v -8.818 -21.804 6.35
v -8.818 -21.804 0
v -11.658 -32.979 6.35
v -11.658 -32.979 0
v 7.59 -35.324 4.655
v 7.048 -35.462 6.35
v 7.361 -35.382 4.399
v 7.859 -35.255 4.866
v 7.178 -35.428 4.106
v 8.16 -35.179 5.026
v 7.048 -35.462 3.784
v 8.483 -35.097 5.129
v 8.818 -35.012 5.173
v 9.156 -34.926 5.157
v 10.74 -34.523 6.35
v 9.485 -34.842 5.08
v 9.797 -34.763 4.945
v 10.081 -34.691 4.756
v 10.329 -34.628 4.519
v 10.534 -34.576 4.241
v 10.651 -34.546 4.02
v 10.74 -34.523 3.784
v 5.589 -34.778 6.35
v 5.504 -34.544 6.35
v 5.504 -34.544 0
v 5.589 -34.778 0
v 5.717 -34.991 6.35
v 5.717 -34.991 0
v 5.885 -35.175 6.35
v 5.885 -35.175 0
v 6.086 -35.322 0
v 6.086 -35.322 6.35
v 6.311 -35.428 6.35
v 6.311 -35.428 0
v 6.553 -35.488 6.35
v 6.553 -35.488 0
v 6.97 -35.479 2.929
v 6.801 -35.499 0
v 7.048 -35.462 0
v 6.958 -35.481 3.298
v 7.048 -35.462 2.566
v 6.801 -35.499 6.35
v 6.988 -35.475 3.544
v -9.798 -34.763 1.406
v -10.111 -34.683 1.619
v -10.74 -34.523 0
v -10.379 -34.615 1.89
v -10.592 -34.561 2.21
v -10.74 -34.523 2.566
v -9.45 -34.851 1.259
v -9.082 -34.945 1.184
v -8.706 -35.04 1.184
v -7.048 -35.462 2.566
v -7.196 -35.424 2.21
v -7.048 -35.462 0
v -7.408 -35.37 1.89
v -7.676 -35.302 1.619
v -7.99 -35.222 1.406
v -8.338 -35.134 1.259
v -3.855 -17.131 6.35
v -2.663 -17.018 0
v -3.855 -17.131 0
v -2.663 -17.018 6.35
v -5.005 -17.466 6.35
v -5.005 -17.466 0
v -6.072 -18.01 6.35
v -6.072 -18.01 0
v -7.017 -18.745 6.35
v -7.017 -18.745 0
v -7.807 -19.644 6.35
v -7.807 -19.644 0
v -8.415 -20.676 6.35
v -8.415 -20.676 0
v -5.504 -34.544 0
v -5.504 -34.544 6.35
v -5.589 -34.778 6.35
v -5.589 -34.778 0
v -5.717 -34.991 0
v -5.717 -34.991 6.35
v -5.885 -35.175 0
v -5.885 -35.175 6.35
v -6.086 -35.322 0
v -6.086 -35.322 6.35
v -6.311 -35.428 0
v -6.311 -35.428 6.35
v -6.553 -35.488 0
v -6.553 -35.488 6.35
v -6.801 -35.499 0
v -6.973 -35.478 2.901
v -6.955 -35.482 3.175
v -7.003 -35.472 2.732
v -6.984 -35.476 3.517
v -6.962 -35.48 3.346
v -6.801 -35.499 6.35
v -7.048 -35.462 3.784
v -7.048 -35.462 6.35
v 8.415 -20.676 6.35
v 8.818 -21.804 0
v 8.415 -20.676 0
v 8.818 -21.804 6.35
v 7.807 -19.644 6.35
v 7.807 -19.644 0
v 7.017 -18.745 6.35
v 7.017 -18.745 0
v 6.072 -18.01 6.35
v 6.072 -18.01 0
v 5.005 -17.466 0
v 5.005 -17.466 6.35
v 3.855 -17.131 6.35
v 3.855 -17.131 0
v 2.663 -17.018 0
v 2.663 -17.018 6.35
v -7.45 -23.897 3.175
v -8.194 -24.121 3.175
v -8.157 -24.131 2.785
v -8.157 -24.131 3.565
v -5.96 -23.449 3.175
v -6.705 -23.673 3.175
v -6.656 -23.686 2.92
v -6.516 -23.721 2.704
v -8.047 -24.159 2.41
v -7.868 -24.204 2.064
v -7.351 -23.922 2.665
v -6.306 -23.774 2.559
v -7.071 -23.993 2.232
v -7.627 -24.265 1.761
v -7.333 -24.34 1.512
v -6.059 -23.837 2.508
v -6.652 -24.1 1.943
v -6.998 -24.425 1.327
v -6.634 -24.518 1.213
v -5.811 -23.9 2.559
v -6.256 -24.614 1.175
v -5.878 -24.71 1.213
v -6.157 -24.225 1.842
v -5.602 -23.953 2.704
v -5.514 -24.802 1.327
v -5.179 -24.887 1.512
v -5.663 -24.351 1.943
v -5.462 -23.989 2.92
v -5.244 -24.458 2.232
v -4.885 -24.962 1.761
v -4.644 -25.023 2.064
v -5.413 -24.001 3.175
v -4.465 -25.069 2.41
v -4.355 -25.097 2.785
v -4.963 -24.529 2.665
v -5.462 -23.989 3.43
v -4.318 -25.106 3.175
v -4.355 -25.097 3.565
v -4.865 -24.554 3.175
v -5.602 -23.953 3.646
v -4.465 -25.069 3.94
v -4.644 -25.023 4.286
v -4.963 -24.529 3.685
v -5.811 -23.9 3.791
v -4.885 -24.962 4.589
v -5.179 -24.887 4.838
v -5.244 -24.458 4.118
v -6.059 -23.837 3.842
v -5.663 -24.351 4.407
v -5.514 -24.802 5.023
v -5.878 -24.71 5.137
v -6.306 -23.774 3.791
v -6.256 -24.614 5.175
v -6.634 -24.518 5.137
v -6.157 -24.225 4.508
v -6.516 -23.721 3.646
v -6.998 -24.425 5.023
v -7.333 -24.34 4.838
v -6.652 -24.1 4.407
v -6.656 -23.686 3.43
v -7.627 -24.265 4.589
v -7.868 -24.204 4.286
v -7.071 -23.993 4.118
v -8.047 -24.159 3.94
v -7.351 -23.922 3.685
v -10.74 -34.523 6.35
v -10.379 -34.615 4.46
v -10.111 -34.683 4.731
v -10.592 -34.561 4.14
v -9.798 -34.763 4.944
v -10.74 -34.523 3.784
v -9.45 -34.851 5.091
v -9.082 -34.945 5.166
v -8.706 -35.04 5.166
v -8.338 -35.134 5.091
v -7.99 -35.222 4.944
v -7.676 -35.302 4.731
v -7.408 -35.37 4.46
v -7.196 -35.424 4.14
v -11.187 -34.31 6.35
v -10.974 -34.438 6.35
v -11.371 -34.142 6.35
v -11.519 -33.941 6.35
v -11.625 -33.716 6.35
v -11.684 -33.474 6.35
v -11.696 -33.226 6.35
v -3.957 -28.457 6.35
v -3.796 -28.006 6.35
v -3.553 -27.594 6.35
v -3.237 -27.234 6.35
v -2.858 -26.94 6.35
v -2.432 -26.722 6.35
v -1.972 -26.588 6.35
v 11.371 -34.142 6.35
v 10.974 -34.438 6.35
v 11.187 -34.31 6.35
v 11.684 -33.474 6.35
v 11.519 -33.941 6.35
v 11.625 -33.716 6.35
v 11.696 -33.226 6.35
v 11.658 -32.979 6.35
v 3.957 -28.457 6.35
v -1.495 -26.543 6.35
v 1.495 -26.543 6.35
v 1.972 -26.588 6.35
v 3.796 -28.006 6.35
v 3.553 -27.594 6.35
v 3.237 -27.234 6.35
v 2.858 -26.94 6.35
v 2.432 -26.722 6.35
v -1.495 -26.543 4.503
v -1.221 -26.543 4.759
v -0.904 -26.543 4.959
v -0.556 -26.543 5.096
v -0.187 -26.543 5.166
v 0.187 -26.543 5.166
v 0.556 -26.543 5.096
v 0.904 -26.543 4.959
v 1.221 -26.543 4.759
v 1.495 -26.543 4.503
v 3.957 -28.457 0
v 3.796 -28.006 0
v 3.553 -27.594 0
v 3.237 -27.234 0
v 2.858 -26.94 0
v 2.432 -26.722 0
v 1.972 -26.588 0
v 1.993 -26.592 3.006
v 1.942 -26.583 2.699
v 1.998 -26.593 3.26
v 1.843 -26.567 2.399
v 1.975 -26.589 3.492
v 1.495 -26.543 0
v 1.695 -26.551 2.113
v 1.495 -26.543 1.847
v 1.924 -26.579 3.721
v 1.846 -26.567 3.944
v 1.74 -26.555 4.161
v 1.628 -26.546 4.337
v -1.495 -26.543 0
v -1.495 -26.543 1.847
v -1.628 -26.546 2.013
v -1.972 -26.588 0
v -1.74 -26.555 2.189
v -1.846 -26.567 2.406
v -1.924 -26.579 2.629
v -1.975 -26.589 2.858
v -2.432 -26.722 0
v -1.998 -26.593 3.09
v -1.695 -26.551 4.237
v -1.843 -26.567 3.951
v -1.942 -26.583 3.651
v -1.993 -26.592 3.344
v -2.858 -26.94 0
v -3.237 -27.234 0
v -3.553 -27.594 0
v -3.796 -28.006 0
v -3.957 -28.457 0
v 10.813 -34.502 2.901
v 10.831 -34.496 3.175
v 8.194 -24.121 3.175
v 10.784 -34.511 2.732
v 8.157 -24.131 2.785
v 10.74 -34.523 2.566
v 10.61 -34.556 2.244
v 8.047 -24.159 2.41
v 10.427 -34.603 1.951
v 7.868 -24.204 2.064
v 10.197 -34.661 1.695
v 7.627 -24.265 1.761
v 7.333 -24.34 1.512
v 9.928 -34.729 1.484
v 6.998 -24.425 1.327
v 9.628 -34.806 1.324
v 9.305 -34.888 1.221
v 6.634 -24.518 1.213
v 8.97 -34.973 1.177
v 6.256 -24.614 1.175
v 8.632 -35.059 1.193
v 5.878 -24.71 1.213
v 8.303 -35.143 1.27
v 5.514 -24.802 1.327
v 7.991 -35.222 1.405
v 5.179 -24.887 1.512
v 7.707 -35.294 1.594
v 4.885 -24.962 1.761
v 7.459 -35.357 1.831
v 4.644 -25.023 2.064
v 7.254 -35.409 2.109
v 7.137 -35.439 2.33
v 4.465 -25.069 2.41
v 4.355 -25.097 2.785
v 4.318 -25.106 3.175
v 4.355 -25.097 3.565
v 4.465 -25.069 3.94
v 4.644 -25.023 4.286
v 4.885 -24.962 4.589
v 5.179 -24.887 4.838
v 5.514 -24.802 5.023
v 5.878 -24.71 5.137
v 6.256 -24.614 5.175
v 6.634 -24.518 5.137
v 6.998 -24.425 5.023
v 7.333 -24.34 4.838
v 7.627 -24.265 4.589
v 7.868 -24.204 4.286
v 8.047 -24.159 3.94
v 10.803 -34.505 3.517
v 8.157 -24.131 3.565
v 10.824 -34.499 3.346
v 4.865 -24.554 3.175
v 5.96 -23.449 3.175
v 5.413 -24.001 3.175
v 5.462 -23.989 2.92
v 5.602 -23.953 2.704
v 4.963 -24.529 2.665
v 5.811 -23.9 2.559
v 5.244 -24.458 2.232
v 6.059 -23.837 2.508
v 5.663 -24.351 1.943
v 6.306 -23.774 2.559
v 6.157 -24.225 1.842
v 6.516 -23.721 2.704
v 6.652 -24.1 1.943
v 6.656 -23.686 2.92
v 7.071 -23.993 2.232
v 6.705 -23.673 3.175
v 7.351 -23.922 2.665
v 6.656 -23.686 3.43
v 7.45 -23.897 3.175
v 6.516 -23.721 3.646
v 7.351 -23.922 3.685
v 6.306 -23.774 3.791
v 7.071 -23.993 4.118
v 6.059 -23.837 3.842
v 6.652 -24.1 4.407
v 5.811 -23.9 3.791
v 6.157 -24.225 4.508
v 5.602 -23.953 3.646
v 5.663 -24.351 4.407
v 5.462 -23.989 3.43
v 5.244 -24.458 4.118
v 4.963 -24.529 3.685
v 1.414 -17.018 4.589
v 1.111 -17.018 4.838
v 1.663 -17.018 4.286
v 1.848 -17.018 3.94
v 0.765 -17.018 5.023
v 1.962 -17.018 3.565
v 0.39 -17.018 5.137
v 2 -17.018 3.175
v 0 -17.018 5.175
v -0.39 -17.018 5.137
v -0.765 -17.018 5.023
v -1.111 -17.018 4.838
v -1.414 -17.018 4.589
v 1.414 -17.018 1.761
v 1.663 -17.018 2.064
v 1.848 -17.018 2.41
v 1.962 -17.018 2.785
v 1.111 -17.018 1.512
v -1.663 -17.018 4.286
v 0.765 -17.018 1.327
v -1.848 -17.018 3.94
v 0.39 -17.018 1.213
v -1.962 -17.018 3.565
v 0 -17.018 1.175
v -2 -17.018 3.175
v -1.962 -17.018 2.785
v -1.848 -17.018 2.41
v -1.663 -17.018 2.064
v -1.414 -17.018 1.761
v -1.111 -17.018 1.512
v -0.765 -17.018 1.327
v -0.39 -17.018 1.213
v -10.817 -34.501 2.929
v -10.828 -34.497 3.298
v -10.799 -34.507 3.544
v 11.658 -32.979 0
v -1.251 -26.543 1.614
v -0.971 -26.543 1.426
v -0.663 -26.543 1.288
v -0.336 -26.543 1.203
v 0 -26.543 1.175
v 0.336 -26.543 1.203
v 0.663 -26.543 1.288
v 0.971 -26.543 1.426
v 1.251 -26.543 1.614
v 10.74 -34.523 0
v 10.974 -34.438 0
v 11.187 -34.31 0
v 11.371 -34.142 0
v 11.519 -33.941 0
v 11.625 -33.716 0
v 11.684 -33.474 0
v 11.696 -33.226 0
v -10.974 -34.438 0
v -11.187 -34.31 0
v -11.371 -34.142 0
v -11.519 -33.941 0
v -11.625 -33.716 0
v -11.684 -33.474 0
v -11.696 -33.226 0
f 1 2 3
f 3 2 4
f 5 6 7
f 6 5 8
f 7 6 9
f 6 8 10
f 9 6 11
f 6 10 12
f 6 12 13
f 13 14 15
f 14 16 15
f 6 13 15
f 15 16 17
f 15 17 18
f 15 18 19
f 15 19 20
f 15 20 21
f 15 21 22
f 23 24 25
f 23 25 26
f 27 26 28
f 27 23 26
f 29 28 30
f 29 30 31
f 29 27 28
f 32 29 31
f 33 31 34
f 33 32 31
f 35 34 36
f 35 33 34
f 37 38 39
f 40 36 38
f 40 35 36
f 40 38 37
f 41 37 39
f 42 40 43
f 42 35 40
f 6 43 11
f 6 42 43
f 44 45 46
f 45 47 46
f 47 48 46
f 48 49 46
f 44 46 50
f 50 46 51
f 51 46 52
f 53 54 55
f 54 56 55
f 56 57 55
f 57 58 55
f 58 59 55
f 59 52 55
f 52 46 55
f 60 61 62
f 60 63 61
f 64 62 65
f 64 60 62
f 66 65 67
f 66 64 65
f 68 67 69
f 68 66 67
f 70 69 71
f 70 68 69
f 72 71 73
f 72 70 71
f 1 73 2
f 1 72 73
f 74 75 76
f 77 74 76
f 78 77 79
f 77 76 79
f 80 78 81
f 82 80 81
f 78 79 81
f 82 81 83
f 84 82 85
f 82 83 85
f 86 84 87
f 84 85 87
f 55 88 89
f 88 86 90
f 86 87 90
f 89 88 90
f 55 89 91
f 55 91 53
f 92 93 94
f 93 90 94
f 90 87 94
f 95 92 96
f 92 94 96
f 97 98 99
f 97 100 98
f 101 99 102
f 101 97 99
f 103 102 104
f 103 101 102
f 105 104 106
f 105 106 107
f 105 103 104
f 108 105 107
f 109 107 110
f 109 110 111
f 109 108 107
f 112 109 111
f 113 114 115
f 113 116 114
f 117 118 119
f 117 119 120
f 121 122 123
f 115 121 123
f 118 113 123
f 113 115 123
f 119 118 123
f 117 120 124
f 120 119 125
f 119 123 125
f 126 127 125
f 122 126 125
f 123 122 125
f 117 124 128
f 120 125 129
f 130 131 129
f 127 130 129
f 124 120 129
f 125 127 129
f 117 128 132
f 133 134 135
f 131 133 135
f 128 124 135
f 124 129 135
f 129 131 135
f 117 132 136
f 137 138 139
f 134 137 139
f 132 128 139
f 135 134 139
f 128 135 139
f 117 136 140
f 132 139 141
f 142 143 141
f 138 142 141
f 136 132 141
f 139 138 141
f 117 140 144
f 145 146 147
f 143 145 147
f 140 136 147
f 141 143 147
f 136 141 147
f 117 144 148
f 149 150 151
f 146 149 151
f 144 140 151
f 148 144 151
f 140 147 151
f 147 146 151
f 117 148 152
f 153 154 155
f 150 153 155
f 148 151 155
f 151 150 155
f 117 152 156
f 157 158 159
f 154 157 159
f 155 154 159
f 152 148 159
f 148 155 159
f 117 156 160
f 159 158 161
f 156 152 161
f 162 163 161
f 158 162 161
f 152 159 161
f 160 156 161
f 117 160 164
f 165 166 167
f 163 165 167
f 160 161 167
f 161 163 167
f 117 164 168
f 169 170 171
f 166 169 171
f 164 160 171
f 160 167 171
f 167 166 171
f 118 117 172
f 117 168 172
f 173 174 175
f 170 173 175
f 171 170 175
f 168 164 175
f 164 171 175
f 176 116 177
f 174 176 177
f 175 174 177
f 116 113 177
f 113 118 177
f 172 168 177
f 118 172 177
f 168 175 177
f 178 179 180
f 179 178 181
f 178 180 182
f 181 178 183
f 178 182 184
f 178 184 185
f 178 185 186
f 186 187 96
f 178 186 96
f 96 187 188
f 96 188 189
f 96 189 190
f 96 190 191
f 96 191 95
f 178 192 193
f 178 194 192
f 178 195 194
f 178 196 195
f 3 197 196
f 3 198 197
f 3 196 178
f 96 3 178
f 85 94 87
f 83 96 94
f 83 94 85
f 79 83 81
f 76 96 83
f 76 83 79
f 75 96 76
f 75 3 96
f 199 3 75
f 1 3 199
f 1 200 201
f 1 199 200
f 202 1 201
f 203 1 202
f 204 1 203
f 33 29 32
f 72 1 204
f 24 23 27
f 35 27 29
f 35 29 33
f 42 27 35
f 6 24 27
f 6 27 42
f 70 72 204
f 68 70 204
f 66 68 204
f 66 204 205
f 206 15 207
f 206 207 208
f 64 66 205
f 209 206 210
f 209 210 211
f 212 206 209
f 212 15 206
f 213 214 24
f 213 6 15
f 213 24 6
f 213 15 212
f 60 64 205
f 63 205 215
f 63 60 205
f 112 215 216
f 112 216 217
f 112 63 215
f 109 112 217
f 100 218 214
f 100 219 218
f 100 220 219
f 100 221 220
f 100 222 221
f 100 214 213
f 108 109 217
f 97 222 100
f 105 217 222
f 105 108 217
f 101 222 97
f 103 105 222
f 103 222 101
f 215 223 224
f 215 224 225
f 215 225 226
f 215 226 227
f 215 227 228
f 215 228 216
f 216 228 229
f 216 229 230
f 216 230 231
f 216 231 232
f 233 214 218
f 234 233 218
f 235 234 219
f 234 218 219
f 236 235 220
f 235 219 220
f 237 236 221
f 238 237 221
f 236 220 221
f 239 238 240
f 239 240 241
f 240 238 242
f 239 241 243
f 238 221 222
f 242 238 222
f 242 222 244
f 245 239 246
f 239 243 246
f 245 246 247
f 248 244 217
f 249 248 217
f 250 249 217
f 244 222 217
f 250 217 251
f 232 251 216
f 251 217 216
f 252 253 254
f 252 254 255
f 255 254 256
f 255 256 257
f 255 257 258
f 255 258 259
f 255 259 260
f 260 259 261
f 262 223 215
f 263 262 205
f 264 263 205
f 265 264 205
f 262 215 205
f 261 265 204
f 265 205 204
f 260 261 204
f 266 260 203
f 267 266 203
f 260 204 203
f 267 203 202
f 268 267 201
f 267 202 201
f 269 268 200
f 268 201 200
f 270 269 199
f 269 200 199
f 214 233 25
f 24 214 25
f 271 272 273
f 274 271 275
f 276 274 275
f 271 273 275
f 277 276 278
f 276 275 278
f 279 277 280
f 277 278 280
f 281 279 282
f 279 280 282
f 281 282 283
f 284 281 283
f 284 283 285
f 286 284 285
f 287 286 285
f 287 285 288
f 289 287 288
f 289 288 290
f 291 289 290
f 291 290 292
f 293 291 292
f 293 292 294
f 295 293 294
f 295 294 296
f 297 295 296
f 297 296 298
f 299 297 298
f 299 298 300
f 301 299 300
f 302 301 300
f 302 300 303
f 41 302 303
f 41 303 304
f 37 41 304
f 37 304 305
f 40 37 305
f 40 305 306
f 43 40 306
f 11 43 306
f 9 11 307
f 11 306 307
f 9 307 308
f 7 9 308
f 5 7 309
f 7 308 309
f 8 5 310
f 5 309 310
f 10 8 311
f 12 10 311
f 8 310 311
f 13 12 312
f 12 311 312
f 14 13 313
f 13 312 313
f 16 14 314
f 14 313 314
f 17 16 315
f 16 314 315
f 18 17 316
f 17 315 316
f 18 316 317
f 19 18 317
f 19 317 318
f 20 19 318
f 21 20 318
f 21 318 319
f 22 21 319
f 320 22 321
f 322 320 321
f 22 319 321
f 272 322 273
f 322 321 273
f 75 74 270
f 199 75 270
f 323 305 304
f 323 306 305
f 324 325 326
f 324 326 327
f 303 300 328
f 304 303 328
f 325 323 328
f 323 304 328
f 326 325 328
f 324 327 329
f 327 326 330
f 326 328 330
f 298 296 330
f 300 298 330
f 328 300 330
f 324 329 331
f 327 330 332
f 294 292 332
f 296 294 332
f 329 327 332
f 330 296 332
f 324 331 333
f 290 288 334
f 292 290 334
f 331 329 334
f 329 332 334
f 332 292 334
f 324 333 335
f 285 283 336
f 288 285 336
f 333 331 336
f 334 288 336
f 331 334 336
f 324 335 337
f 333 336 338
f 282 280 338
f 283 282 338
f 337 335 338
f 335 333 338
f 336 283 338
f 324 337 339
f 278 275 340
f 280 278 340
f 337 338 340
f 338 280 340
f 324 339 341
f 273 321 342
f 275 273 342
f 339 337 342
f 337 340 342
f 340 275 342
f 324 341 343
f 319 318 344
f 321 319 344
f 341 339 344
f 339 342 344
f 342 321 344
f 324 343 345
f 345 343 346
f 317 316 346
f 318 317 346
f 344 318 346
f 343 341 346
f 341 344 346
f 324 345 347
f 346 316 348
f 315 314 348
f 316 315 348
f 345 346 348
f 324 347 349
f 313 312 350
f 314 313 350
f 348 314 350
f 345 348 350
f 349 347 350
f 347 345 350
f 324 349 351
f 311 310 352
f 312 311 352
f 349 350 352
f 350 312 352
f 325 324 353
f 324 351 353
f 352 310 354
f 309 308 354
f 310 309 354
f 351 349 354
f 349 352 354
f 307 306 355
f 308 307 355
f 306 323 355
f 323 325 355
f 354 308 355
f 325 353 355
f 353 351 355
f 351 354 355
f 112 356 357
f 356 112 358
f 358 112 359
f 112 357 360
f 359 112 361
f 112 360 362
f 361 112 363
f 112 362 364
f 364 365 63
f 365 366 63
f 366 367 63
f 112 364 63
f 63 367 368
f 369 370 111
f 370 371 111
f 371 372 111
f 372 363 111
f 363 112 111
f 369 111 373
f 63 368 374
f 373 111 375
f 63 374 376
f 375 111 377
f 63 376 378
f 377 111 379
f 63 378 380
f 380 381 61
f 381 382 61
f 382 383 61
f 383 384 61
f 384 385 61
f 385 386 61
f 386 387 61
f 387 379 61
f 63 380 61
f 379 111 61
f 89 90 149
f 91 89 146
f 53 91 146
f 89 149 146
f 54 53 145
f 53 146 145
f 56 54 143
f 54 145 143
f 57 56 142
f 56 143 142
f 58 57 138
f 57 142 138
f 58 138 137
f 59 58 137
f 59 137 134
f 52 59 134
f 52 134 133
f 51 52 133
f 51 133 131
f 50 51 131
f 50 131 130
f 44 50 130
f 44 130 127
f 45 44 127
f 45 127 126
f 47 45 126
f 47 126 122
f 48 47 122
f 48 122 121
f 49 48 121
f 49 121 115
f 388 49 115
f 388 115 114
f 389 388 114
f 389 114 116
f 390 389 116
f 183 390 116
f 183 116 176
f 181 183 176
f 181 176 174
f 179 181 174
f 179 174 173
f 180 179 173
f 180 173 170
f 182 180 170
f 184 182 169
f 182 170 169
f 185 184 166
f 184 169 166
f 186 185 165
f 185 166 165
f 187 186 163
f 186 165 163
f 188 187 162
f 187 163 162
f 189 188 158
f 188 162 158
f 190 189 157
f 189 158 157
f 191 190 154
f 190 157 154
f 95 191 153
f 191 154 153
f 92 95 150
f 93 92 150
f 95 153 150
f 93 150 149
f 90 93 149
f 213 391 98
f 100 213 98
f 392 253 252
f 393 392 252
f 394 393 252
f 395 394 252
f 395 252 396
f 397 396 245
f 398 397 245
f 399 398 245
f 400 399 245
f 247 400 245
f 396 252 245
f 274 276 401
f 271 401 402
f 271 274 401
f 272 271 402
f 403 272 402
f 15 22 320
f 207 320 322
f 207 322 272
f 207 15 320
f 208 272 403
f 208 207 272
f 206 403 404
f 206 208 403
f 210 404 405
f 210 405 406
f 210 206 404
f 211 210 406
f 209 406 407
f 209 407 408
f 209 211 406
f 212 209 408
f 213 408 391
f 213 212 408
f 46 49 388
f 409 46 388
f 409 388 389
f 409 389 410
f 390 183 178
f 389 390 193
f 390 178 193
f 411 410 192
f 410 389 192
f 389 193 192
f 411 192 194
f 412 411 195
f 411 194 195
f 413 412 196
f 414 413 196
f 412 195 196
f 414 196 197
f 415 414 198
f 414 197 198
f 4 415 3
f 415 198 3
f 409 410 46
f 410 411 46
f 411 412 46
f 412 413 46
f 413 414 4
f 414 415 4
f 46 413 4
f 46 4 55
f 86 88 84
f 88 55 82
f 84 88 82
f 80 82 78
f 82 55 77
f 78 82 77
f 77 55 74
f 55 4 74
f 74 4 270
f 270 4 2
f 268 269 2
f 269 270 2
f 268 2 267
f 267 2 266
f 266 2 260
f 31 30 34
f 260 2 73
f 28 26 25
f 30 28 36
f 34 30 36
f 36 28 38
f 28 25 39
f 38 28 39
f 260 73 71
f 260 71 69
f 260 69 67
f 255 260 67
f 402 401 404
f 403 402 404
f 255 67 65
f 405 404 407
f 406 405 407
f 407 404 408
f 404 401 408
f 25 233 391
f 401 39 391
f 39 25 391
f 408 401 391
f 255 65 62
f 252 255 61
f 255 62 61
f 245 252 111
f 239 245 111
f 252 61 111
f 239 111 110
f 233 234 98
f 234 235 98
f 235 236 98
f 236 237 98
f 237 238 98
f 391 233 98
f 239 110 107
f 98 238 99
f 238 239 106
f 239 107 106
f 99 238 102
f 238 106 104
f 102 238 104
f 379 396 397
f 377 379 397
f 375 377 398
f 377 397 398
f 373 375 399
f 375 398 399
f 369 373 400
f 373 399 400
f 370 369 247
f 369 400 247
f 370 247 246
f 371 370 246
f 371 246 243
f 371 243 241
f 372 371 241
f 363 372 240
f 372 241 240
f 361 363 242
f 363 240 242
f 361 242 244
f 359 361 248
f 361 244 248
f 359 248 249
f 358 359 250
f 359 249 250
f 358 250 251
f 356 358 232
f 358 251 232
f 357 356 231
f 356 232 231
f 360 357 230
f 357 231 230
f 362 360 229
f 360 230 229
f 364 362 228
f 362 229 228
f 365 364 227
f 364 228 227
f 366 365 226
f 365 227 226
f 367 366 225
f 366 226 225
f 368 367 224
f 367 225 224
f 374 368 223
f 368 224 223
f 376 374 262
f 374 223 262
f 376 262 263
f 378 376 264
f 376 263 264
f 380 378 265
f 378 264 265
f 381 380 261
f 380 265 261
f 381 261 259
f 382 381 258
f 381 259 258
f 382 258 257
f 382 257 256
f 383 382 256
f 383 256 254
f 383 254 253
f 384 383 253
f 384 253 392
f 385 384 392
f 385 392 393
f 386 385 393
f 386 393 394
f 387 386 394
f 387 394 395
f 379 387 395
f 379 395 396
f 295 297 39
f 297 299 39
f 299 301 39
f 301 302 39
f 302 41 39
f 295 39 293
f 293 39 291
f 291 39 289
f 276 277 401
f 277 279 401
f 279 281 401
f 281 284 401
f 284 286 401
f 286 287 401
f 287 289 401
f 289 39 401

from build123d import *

# Parameters (mm, degrees)
BOSS_EXTRUDE1_DEPTH                 = 6.35
FILLET1_R                           = 6.35
FILLET2_R                           = 2.54
FILLET3_R                           = 1.27
F_8_32_TAPPED_HOLE3_D               = 4
F_8_32_TAPPED_HOLE3_DEPTH           = 10.70864
F_8_32_TAPPED_HOLE3_TIP             = 1.201721238
F_8_32_TAPPED_HOLE3_ON_FACE_2_D     = 4
F_8_32_TAPPED_HOLE3_ON_FACE_2_DEPTH = 10.70864
F_8_32_TAPPED_HOLE3_ON_FACE_2_TIP   = 1.201721238
F_8_32_TAPPED_HOLE3_ON_FACE_3_D     = 4
F_8_32_TAPPED_HOLE3_ON_FACE_3_DEPTH = 10.70864
F_8_32_TAPPED_HOLE3_ON_FACE_3_TIP   = 1.201721238


with BuildPart() as part:
    # Sketch1 → Boss-Extrude1 (new body)
    with BuildSketch(Plane.XY):
        Polygon((-11.971057013, -34.21026192), (-5.816733064, -35.774485923), (-3.470397058, -26.543), (3.470397058, -26.543), (5.816733064, -35.774485923), (11.971057013, -34.21026192), (7.601357108, -17.018), (-7.601357108, -17.018), align=None)
    extrude(amount=BOSS_EXTRUDE1_DEPTH)

    # Fillet1
    fillet1_edges = [part.edges().sort_by_distance(p)[0] for p in [
        (-7.601357108, -17.018, 3.175),
        (7.601357108, -17.018, 3.175),
    ]]
    fillet(fillet1_edges, radius=FILLET1_R)

    # Fillet2
    fillet2_edges = [part.edges().sort_by_distance(p)[0] for p in [
        (3.470397058, -26.543, 3.175),
        (-3.470397058, -26.543, 3.175),
    ]]
    fillet(fillet2_edges, radius=FILLET2_R)

    # Fillet3
    fillet3_edges = [part.edges().sort_by_distance(p)[0] for p in [
        (-5.816733064, -35.774485923, 3.175),
        (-11.971057013, -34.21026192, 3.175),
        (11.971057013, -34.21026192, 3.175),
        (5.816733064, -35.774485923, 3.175),
    ]]
    fillet(fillet3_edges, radius=FILLET3_R)

    # #8-32 Tapped Hole3
    with Locations(Plane(origin=(-8.893895038, -34.992373921, 3.175), x_dir=(-0.969184873822, 0.246334488763, 0), z_dir=(-0.246334488763, -0.969184873822, 0))):
        with Locations((0, 0)):
            Hole(F_8_32_TAPPED_HOLE3_D / 2, depth=F_8_32_TAPPED_HOLE3_DEPTH)
            with Locations((0, 0, -(F_8_32_TAPPED_HOLE3_DEPTH + F_8_32_TAPPED_HOLE3_TIP / 2))):  # 118° drill point
                Cone(0, F_8_32_TAPPED_HOLE3_D / 2, F_8_32_TAPPED_HOLE3_TIP, mode=Mode.SUBTRACT)

    # #8-32 Tapped Hole3 on face 2
    with Locations(Plane(origin=(8.893895038, -34.992373921, 3.175), x_dir=(-0.969184998168, -0.246333999534, 0), z_dir=(0.246333999534, -0.969184998168, 0))):
        with Locations((0, 0)):
            Hole(F_8_32_TAPPED_HOLE3_ON_FACE_2_D / 2, depth=F_8_32_TAPPED_HOLE3_ON_FACE_2_DEPTH)
            with Locations((0, 0, -(F_8_32_TAPPED_HOLE3_ON_FACE_2_DEPTH + F_8_32_TAPPED_HOLE3_ON_FACE_2_TIP / 2))):  # 118° drill point
                Cone(0, F_8_32_TAPPED_HOLE3_ON_FACE_2_D / 2, F_8_32_TAPPED_HOLE3_ON_FACE_2_TIP, mode=Mode.SUBTRACT)

    # #8-32 Tapped Hole3 on face 3
    with Locations(Plane(origin=(0, -17.018, 3.175), x_dir=(0, 0, 1), z_dir=(0, 1, 0))):
        with Locations((0, 0)):
            Hole(F_8_32_TAPPED_HOLE3_ON_FACE_3_D / 2, depth=F_8_32_TAPPED_HOLE3_ON_FACE_3_DEPTH)
            with Locations((0, 0, -(F_8_32_TAPPED_HOLE3_ON_FACE_3_DEPTH + F_8_32_TAPPED_HOLE3_ON_FACE_3_TIP / 2))):  # 118° drill point
                Cone(0, F_8_32_TAPPED_HOLE3_ON_FACE_3_D / 2, F_8_32_TAPPED_HOLE3_ON_FACE_3_TIP, mode=Mode.SUBTRACT)


solid = part.part
